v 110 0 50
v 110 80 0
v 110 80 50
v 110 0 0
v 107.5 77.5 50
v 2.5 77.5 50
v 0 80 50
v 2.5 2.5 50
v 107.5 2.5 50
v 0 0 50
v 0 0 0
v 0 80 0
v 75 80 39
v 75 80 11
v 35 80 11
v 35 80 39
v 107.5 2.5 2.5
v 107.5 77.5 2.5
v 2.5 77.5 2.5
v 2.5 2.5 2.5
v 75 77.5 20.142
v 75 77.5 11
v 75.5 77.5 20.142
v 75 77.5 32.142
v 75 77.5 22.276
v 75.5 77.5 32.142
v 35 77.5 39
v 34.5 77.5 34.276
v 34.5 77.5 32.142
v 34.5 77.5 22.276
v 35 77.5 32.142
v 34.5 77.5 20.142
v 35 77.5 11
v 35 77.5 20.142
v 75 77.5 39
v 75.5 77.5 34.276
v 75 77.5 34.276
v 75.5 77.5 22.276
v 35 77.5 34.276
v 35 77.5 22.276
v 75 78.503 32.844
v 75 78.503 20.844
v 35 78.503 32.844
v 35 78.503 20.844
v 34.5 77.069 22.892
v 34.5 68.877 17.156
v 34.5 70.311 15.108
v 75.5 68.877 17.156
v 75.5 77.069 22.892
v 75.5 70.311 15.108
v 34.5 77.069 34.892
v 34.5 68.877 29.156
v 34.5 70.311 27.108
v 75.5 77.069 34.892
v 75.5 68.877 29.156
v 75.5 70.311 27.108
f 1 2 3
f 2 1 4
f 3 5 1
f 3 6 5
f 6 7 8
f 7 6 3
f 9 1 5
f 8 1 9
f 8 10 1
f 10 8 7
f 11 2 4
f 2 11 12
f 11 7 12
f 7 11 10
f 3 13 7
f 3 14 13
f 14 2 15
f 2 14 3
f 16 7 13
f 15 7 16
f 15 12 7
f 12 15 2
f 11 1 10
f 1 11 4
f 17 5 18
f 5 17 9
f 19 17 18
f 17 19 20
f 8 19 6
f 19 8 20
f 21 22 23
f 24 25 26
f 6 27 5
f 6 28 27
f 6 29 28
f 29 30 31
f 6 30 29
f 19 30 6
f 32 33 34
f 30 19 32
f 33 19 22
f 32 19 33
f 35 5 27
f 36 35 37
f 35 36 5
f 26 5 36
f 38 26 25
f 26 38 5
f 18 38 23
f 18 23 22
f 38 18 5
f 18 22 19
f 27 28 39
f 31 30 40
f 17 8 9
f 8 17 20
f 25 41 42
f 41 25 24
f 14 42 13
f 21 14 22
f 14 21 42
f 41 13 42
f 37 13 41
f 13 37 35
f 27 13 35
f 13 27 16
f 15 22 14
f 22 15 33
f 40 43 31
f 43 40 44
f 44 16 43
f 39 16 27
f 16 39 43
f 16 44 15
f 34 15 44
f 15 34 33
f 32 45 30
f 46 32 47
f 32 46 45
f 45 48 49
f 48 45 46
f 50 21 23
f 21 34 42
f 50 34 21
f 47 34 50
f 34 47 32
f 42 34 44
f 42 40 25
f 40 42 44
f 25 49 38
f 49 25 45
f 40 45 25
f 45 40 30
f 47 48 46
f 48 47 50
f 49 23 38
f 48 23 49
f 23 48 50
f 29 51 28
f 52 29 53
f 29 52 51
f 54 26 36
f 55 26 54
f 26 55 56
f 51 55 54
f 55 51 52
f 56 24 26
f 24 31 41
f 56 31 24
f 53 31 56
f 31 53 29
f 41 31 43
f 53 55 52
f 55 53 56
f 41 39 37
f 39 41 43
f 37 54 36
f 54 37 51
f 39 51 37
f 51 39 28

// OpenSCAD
$fn = 32;

// ----------------------------------------------------------------------
// Vent box: louvers enclosure
// ----------------------------------------------------------------------

// --- parameters (mm) ---
box_l = 110;              // box length, X
box_w = 80;               // box width, Y
box_h = 50;               // box height, Z
wall_t = 2.5;             // shell wall thickness
win_l = 40;               // vent window width, X
win_h = 28;               // vent window height, Z
slat_t = 2.5;             // louver slat thickness
slat_d = 10;              // louver slat depth
slat_a = 35;              // louver slat angle, degrees
slat_pitch = 12;          // louver pitch
slat_yc = 73.69;          // slat centreline Y

win_z0 = (box_h - win_h) / 2;  // window lower edge Z
n_slats = 2;  // louver count
slat_z0 = win_z0 + (win_h - (n_slats - 1) * slat_pitch) / 2;

difference() {
  union() {
    difference() {
      cube([box_l, box_w, box_h]);
  translate([wall_t, wall_t, wall_t])
    cube([box_l - 2 * wall_t, box_w - 2 * wall_t, box_h]);
  translate([(box_l - win_l) / 2, box_w - wall_t - 1, win_z0])
    cube([win_l, wall_t + 2, win_h]);
    }
    for (i = [0 : n_slats - 1])
      translate([box_l / 2, slat_yc, slat_z0 + i * slat_pitch])
        rotate([slat_a, 0, 0])
          cube([win_l + 1, slat_d, slat_t], center = true);
  }
}
